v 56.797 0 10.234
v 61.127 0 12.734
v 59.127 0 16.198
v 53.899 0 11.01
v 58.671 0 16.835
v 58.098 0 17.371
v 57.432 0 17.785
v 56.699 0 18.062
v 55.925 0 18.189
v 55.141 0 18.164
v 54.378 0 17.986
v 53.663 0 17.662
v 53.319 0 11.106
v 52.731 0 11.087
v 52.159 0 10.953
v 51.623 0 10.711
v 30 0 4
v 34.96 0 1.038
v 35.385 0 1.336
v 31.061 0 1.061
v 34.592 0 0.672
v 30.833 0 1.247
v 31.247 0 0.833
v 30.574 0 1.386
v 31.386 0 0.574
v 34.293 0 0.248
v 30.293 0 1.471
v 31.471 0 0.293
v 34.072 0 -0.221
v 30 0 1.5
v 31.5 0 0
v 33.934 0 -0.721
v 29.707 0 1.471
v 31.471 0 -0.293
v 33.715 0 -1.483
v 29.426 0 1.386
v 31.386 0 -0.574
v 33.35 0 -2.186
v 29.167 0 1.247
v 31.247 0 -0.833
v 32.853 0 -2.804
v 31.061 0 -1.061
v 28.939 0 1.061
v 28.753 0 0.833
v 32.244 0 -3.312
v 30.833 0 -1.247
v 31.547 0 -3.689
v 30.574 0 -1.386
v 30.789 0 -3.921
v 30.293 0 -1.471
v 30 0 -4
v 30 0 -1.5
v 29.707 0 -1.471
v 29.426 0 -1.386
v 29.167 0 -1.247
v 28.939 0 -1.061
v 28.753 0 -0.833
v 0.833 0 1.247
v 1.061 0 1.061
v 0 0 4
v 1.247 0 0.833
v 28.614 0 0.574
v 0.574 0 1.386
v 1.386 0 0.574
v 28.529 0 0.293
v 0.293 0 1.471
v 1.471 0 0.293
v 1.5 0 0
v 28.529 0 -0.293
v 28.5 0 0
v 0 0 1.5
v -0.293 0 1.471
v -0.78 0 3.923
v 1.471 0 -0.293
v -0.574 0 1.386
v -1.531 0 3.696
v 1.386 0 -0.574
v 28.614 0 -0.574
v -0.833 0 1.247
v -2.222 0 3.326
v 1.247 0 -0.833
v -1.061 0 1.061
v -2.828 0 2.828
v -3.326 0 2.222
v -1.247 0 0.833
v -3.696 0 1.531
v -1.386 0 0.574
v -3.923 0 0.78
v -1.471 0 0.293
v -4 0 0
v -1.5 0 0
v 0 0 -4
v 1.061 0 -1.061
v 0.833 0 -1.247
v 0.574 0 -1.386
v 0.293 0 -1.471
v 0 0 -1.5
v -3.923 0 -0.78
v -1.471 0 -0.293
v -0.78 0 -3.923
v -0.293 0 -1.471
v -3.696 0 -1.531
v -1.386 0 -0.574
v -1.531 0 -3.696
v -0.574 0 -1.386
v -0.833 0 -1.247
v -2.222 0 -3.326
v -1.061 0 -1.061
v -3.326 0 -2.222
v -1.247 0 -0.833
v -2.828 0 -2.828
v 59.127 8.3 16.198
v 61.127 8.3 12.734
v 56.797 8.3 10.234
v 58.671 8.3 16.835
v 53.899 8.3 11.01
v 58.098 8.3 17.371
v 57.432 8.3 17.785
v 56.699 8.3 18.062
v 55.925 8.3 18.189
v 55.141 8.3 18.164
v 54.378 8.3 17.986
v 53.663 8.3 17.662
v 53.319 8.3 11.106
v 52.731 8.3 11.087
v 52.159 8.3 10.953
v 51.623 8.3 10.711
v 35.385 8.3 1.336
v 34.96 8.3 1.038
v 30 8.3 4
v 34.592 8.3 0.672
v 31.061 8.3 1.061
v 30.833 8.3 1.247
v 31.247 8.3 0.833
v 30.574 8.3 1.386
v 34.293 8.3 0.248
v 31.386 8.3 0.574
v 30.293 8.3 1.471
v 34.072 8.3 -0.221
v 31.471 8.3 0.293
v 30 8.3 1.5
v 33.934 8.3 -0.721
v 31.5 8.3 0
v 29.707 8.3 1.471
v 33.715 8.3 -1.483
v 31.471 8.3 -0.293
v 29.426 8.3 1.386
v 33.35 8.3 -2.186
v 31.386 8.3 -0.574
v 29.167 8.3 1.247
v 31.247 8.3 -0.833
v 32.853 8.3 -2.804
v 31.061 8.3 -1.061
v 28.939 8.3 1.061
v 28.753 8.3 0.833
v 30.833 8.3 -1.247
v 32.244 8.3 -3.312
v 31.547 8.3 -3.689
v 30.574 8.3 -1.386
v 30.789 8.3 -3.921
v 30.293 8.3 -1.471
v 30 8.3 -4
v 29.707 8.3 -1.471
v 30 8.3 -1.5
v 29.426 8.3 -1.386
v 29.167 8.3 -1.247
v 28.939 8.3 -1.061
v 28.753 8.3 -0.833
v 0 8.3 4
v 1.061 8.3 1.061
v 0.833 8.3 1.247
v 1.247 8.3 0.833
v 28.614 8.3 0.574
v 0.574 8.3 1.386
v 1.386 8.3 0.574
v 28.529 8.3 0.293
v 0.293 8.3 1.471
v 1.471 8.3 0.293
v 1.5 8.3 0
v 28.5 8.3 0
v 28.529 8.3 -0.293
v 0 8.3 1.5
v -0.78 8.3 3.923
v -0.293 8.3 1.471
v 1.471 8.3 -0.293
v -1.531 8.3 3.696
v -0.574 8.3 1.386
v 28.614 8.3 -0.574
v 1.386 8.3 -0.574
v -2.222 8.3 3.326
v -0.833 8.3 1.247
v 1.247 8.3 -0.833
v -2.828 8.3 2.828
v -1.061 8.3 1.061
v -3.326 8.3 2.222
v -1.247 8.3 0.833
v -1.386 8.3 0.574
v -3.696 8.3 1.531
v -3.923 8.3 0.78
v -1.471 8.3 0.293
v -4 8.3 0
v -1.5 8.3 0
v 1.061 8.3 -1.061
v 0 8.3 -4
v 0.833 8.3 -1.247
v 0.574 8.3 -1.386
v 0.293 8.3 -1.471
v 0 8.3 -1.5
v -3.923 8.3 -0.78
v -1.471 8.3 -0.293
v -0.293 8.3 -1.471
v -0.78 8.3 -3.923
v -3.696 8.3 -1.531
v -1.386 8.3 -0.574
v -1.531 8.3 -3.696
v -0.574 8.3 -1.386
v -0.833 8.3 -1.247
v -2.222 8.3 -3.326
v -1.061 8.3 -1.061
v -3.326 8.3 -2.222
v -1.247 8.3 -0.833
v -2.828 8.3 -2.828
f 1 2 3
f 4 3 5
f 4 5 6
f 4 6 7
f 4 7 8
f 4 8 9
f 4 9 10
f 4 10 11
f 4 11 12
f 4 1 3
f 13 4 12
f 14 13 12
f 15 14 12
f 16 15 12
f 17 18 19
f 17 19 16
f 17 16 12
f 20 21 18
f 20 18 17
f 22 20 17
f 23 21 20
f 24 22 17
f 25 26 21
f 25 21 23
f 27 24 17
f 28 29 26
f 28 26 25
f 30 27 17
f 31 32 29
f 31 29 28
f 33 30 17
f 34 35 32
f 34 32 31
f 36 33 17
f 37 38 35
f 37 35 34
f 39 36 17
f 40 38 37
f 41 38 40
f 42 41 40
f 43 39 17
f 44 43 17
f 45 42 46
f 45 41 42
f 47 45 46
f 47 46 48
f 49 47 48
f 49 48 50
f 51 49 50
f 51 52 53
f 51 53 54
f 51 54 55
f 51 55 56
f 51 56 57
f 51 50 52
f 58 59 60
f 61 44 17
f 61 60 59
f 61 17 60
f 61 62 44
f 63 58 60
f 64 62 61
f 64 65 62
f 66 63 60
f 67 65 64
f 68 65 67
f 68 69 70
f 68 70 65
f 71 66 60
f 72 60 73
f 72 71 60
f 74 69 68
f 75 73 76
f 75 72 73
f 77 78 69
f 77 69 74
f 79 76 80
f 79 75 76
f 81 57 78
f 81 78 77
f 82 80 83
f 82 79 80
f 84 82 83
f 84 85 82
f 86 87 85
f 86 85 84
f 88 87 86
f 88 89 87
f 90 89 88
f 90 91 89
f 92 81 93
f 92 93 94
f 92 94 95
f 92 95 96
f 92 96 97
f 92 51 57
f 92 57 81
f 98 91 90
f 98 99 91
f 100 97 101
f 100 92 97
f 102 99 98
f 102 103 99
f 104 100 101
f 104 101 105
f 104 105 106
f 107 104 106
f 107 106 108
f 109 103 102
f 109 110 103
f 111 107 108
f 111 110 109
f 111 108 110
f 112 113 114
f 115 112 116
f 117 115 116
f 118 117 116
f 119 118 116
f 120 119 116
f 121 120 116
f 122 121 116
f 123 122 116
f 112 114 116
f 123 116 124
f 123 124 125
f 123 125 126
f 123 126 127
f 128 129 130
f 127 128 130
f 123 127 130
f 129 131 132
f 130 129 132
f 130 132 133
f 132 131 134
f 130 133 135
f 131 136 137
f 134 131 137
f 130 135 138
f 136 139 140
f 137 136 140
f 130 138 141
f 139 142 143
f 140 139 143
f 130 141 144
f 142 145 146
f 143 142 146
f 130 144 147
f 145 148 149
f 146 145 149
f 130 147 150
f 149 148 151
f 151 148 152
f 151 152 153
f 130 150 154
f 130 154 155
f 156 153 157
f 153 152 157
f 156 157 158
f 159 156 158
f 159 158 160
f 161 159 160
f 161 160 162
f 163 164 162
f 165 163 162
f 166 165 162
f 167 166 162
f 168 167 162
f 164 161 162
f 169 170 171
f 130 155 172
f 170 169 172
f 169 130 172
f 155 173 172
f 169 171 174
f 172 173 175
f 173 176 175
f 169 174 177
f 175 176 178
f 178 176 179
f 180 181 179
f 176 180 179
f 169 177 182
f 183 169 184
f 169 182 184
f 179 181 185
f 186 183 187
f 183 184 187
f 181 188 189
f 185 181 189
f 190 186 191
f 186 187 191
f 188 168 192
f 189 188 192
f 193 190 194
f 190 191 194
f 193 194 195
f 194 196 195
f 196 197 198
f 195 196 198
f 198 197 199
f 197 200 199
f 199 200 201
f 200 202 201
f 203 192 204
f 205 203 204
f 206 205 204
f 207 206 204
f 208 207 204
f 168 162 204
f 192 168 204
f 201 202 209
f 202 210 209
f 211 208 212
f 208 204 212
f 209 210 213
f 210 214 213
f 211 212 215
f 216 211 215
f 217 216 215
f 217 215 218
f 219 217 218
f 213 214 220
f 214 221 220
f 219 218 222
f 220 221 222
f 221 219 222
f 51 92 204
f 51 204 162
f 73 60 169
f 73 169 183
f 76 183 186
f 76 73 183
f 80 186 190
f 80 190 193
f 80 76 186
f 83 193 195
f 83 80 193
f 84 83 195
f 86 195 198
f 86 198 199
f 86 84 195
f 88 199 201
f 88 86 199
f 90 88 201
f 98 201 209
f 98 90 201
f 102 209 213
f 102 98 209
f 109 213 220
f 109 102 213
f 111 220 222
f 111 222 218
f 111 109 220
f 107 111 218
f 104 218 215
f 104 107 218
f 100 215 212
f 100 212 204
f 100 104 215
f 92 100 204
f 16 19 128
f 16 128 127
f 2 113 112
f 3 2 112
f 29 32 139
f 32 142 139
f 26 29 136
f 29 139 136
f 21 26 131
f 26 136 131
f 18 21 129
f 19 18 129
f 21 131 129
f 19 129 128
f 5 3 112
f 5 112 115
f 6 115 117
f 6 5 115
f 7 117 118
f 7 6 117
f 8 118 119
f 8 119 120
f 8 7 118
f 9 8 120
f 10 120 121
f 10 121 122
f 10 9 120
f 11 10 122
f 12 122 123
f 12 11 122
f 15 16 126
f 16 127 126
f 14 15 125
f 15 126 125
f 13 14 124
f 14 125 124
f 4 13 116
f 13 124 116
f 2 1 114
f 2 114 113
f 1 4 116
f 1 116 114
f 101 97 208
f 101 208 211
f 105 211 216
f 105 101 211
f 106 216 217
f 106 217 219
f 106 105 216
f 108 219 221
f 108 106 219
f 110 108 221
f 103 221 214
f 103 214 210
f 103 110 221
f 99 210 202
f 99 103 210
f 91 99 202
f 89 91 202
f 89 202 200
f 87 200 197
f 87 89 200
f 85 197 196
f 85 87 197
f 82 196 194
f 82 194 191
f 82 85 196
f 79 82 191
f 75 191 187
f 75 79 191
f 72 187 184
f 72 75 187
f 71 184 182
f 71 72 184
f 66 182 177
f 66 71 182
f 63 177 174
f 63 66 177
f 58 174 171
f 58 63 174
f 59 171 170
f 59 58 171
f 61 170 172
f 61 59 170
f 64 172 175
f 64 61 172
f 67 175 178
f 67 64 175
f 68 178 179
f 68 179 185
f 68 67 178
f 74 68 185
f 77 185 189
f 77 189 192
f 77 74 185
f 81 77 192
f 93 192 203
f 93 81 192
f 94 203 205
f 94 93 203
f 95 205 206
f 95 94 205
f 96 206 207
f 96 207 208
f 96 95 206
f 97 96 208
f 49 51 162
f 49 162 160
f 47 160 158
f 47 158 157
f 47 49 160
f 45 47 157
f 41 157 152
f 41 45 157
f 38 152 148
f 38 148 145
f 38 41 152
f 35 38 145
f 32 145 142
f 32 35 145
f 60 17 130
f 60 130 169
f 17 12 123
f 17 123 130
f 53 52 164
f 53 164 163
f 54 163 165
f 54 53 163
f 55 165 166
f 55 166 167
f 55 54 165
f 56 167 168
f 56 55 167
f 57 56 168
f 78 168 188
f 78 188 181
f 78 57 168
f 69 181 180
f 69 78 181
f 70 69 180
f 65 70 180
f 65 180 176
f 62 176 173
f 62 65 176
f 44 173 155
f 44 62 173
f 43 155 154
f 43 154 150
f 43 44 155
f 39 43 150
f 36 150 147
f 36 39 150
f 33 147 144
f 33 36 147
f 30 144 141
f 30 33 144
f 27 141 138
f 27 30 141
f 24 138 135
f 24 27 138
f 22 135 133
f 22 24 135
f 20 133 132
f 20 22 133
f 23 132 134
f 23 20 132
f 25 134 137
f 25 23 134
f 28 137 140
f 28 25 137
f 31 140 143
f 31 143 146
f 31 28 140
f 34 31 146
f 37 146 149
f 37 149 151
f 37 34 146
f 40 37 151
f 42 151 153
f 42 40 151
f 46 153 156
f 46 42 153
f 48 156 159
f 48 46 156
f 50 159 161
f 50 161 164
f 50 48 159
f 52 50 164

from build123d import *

# Parameters (mm, degrees)
SKETCH1_R           = 1.5
BOSS_EXTRUDE1_DEPTH = 8.3
FILLET1_R           = 3


with BuildPart() as part:
    # Sketch1 → Boss-Extrude1 (new body)
    with BuildSketch(Plane(origin=(0, 0, 0), x_dir=(1, 0, 0), z_dir=(0, 1, 0))):
        with BuildLine():
            Line((0, 4), (30, 4))
            ThreePointArc((30, 4), (33.005515029, 2.639484686), (33.966505447, -0.516560296))
            Line((33.966505447, -0.516560296), (52.699163274, -11.331865335))
            Line((52.699163274, -11.331865335), (56.797239485, -10.233789123))
            Line((56.797239485, -10.233789123), (61.127366504, -12.733789123))
            Line((61.127366504, -12.733789123), (59.127366504, -16.197890739))
            ThreePointArc((59.127366504, -16.197890739), (56.69854107, -18.061594044), (53.663264889, -17.661992354))
            Line((53.663264889, -17.661992354), (30, -4))
            Line((30, -4), (0, -4))
            ThreePointArc((0, -4), (-4, 0), (0, 4))
        make_face()
        with Locations(Location((0, 0, 0), (0, 0, 90))):
            Circle(SKETCH1_R, mode=Mode.SUBTRACT)
        with Locations(Location((30, 0, 0), (0, 0, 90))):
            Circle(SKETCH1_R, mode=Mode.SUBTRACT)
    extrude(amount=BOSS_EXTRUDE1_DEPTH)

    # Fillet1
    fillet1_edges = [part.edges().sort_by_distance(p)[0] for p in [
        (52.699163274, 4.15, 11.331865335),
        (33.966505447, 4.15, 0.516560296),
    ]]
    fillet(fillet1_edges, radius=FILLET1_R)


solid = part.part
